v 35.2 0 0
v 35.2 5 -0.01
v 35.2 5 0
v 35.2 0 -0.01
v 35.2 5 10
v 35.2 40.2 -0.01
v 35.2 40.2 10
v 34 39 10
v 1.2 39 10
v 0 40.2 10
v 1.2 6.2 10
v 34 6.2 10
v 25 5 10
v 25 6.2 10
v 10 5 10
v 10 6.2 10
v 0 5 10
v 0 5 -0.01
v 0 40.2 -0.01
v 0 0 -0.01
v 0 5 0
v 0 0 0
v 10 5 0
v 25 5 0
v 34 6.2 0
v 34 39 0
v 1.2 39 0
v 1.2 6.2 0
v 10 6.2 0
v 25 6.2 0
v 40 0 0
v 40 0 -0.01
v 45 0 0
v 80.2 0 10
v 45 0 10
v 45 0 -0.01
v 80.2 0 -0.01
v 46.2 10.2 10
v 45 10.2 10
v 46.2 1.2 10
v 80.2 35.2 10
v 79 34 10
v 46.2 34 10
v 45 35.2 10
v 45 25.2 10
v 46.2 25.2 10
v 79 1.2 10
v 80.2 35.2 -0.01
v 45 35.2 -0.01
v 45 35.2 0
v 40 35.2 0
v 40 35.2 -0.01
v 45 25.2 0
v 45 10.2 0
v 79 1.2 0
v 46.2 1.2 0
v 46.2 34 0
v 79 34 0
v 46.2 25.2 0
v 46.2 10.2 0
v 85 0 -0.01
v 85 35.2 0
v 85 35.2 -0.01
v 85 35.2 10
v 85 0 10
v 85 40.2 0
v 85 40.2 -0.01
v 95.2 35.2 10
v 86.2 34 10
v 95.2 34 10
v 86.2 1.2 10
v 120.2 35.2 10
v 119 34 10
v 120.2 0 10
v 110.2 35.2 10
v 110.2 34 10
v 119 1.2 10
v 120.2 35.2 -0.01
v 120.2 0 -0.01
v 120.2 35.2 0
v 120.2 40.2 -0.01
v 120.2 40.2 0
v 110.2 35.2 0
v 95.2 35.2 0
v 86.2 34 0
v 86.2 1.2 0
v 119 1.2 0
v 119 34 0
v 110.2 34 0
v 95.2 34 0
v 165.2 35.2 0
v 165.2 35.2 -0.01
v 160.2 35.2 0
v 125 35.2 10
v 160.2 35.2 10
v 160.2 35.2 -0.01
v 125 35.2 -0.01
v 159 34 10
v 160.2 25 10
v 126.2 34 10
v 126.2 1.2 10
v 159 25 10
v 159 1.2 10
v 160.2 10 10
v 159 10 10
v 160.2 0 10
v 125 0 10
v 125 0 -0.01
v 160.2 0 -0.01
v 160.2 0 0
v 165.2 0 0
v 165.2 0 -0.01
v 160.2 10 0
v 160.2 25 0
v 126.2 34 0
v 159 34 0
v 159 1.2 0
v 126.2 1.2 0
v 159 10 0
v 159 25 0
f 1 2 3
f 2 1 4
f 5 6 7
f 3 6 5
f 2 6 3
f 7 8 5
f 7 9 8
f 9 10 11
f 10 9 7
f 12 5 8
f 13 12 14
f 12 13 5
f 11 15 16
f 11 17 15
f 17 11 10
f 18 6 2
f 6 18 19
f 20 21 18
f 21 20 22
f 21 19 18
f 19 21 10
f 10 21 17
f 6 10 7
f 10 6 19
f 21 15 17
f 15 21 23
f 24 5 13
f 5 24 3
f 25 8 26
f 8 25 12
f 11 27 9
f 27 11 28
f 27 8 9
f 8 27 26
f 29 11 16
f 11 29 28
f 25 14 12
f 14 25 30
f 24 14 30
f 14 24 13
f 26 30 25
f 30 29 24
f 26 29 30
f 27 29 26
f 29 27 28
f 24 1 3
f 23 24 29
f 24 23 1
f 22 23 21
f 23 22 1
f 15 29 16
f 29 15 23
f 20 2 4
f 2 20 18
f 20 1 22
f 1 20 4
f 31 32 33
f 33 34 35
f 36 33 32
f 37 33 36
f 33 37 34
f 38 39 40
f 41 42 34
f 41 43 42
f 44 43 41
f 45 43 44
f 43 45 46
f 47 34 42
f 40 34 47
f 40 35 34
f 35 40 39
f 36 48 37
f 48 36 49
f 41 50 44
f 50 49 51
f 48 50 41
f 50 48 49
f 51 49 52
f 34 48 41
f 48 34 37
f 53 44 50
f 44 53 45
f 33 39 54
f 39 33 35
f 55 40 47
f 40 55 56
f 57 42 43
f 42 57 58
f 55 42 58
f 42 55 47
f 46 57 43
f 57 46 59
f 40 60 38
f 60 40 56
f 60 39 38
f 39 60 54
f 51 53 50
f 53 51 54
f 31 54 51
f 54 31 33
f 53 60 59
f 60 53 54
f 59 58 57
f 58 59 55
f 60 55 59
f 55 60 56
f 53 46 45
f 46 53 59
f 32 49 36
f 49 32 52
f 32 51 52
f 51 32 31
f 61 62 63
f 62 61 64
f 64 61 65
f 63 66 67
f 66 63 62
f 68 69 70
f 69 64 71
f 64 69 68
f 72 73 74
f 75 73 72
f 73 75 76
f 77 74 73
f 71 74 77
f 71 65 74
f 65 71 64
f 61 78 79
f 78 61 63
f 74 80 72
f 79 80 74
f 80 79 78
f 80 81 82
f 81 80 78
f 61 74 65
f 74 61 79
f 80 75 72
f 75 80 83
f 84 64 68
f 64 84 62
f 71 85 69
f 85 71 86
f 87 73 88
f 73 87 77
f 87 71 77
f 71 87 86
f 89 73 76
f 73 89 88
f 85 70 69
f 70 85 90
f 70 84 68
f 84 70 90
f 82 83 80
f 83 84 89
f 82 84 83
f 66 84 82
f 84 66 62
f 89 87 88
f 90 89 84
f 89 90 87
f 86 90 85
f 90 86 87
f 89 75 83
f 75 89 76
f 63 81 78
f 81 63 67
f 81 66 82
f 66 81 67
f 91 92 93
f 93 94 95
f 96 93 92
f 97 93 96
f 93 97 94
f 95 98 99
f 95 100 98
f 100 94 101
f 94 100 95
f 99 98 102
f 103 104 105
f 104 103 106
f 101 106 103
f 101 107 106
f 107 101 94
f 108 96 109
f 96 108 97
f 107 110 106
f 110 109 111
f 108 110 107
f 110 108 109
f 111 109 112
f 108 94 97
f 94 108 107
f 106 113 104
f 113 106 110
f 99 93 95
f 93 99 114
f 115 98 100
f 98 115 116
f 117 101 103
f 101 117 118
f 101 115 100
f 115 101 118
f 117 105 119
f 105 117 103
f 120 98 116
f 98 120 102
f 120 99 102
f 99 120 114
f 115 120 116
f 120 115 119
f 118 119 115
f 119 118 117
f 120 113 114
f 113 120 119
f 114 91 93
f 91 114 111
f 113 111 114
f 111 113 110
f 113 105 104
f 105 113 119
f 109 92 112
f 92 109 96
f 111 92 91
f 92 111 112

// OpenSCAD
// file: ../../Base/Boxes.scad
// Fischertechnik Box Foundation
// Pre-designed Boxes

use <Constants.scad>

include <PlacementOptions.scad>

box190Width = 190;
box190Depth = 130;
box130Width = 130;
box130Depth = 95;
boxUsageHeight = 33.9;
boxWallThickness = 2.4;
boxBaseThickness = 1.0;

// getBoxWallThickness()
// Gets the wall thickness of a Fischertechnik Box

function getBoxWallThickness() = boxWallThickness;

// Gets the usable height of a fischertechnik box
function getBoxUsageHeight() = boxUsageHeight;

// Gets the thickness of the Fischertechnik box base.
function getBoxBaseThickness() = boxBaseThickness;

// Gets the usable inner space of a Box 190 as an x/y-list
function getBox190Space() = [
    box190Width - 2*getBoxWallThickness(), 
    box190Depth - 2*getBoxWallThickness() ];

// Imports the Fischertechnik empty box 130x190 mm and places it at position 0,0
// 190x130 are the outer sizes, the inner space is slightly smaller. Use getBox190Space() to get the inner sizes.
// This module needs the STL file "Fischertechnik Box 130x190.stl" in the library path.
// The box is positioned that the usable inner space is at the 0,0,0 position. The

module Box190() {
    translate([-getBoxWallThickness(),-getBoxWallThickness(),-getBoxBaseThickness()])
        import("Fischertechnik Box 130x190.stl", convexity=3);
}

// Gets the usable inner space of a Box 130 as an x/y-list
function getBox130Space() = [
    box130Width - 2*getBoxWallThickness(), 
    box130Depth - 2*getBoxWallThickness() ];

// Imports the Fischertechnik empty box 95x130 mm and places it at position 0,0
// 190x130 are the outer sizes, the inner space is slightly smaller. Use getBox190Space() to get the inner sizes.
// This module needs the STL file "Fischertechnik Box 95x130.stl" in the library path.
// The box is positioned that the usable inner space is at the 0,0,0 position. The

module Box130() {
    translate([-getBoxWallThickness(),-getBoxWallThickness(),-getBoxBaseThickness()])
        import("Fischertechnik Box 95x130.stl", convexity=3);
}

// Creates a web at the specified box walls
// corner 0 = LowerLeft, 1 = UpperLeft, 2 = UpperRight, 3 = LowerRight
// side 0 = LeftOfCorner, 1 = RightOfCorner
// distance = Distance in mm from the corner
// box = inner width and depth of the box (default: Box 190)
// webWidth = length of the web (default is 3 mms)
// webThickness = thickness of the web (default is 1 mm)

module BoxWeb(corner, side, distance, box=getBox190Space(), webWidth=3, webThickness=1.0) {
    sink = getBoxWallThickness()/2;

    width = (corner % 2 == 0) ? 
            (side == LeftOfCorner ? webWidth : webThickness) :
            (side == LeftOfCorner ? webThickness : webWidth);

    depth = (corner % 2 == 0) ? 
            (side == RightOfCorner ? webWidth : webThickness) :
            (side == RightOfCorner ? webThickness : webWidth);
    
    xDiff = corner == LowerLeft ? 
                (side == LeftOfCorner ? -sink : distance) :
            (corner == UpperLeft ?                
                (side == LeftOfCorner ? distance : -sink) :
            (corner == UpperRight ?
                (side == LeftOfCorner ? box.x-webWidth+sink : box.x-distance-webThickness) :
                (side == LeftOfCorner ? box.x-distance-webThickness: box.x-webWidth+sink)));

    yDiff = corner == LowerLeft ? 
                (side == RightOfCorner ? -sink : distance) :
            (corner == UpperLeft ?
                (side == RightOfCorner ? box.y-distance : box.y-webWidth+sink) :
            (corner == UpperRight ?
                (side == RightOfCorner ? box.y-webWidth+sink : box.y-distance) :
                (side == RightOfCorner ? distance : -sink)));
    
    translate([xDiff, yDiff, -getExcess()])
        cube([width, depth, boxUsageHeight + 2*getExcess()]);
}
// file: ../../Base/Rotation.scad
// Fischertechnik Box Foundation
// Geometry Helpers Rotation

include <PlacementOptions.scad>

// getRotatedSpace(space, rotation=NoRotation)
// Rotates the space dependent on the specified rotation

function getRotatedSpace(space, rotation=NoRotation) = [
    (rotation == Rotate90 || rotation == Rotate270) ? space.y : space.x,
    (rotation == Rotate90 || rotation == Rotate270) ? space.x : space.y
];

// Rotates the given space around the fixed left lower corner
// space = the space the children needs as width/depth list [width,depth]
// rotation = 0 Rotate0 degrees, 1 Rotate90 degrees, 2 Rotate180 degrees, 3 Rotate270 degrees (equivalent to -90)

module RotateFix(space, rotation=Rotate0) {
    dy = (rotation == Rotate0 || rotation == Rotate270) ? 0 :
        (rotation == Rotate90) ? space.x :
        space.y;
    dx = (rotation < Rotate180) ? 0 :
        (rotation == Rotate180) ? space.x :
        space.y;
    
    translate([dx, dy, 0])
        rotate([0, 0, rotations[rotation]])
            children();
}
// file: ../../Base/Alignment.scad
// Fischertechnik Box Foundation
// Geometry Helpers Alignment

include <PlacementOptions.scad>

// getAlignedX(elementWidth, spaceWidth, align=AlignRight, offset=0)
// Gets the aligned X offset of an element with the given
// width in the given space.
// elementWidth = The width of the element to positon
// spaceWidth = The space where the element should be aligned
// align = 0 AlignLeft, 1 AlignCenter, 2 AlignRight
// offset = an optional offset from the aligned position. When
// aligned left or centered, then positive values are in X direction.
// When aligned right then positive values are in negative X direction.

function getAlignedX(elementWidth, spaceWidth, align=AlignRight, offset=0) =
    (align == AlignLeft) ?
        offset :
        ((align == AlignCenter) ?
        (spaceWidth - elementWidth)/2 + offset :
        spaceWidth - offset - elementWidth);

// getAlignedY(elementDepth, spaceDepth, align=AlignTop, offset=0)
// Gets the aligned Y offset of an element with the given
// depth in the given space.
// elementDepth = The depth of the element to positon
// spaceDepth = The space where the element should be aligned
// align = 0 AlignBottom, 1 AlignCenter, 2 AlignTop
// offset = an optional offset from the aligned position. When
// aligned bottom or centered, then positive values are in Y direction.
// When aligned top then positive values are in negative Y direction.

function getAlignedY(elementDepth, spaceDepth, align=AlignTop, offset=0) =
    (align == AlignBottom) ?
        offset :
        ((align == AlignCenter) ?
        (spaceDepth - elementDepth)/2 + offset :
        spaceDepth - offset - elementDepth);
// file: ../../Base/Constants.scad
// Fischertechnik Box Foundation
// Constants

// Constant values necessary for multiple elements

// Base constants
dividerThickness = 1.2;
excess = 0.01;
fragments = 90;
tolerance = 0.8;

// Gets the thickness of a divider 
function getDividerThickness() = dividerThickness;

// Gets the excess that is used to merge walls into each other
function getExcess() = excess;

// Gets amount of fragments of a cylinder
function getFragments() = fragments;

// Gets the inner tolerance of a frame to each side
function getTolerance() = tolerance;


// Fischertechnik specific constants
axisDiameter = 4;
axisBottomDiameter = axisDiameter + 1;
standardEdgeDistance = 2.5;
standardWebDistance = 11.5;
standardCornerLength = 15;
tubeWallFactor = 1.6;

// Gets axis diameter
function getAxisDiameter() = axisDiameter;

// Gets axis bottom diameter for thicker part at the bottom
function getAxisBottomDiameter() = axisBottomDiameter;

// gets the standard distance to the wall of the box for dockable frames with webs
function getStandardEdgeDistance() = standardEdgeDistance;

// gets the standard distance of each web to the corner of the dockable frame
function getStandardWebDistance() = standardWebDistance;

// gets the standard length of the corner walls of a dockable frame
function getStandardCornerLength() = standardCornerLength;

// gets the wall thickness of a tube.
function getTubeWallThickness() = tubeWallFactor * getDividerThickness();
// file: ../../Base/PlacementOptions.scad
// Fischertechnik Box Foundation
// Placement Options

// Alignment
NoAlign = 0;
AlignLeft = 1;
AlignBottom = 2;
AlignCenter = 3;
AlignRight = 4;
AlignTop = 5;

// Element rotation degree steps
rotations = [0, -90, -180, -270];

// Rotation
NoRotation = 0;
Rotate0 = 0;
Rotate90 = 1;
Rotate180 = 2;
Rotate270 = 3;

// Docking (seen from above)
NoDock = -1;
DockLeft = 0;
DockTop = 1;
DockRight = 2;
DockCorner = 2;
DockBottom = 3;

// Web corners
LowerLeft = 0;
UpperLeft = 1;
UpperRight = 2;
LowerRight = 3;

// Web position relative to corner
LeftOfCorner = 0;
RightOfCorner = 1;
// file: ../../Elements/FramePushButton.scad
// Fischertechnik Box Library
// Frame for Reverse Switch and Push Button (old)
// 31331, 31332

use <../Base/Constants.scad>
use <../ModelBase/Simple.scad>

width = 32;
depth = 32;
height = 10;
addSwitch = 5;

// getFramePushButtonSpace()
// Gets the space the frame for reverse switch or push button needs as width and depth (.x and .y as a list)

function getFramePushButtonSpace() = getFrameOuterVolume([width, depth + addSwitch, height]);

// FramePushButton()
// The walls of the frame are 13 mm high. 
// The complete frame has a tolerance of addition 1 mm in each direction.

module FramePushButton() {
    cutoffWidth = 15;
    cutoffOffset = 10;
    
    Space(getFramePushButtonSpace());
    
    translate([0, addSwitch, 0])
    difference() {
        Frame([width, depth, height]);
        translate([cutoffOffset, -getDividerThickness()/2, 0])
            cube([cutoffWidth, 2*getDividerThickness(), height + getExcess()]);
    }
}

// Tests
color("lightgray") {
FramePushButton();
}
// file: ../../Base/Placement.scad
// Fischertechnik Box Foundation
// Geometry Helpers Placement

use <Constants.scad>
use <Alignment.scad>
use <Rotation.scad>
use <Boxes.scad>

include <PlacementOptions.scad>

// Place(x=0, y=0, elementSpace=[0,0], alignX=AlignLeft, alignY=AlignBottom, rotation=Rotate0, boxSpace=getBox190Space())
// Places the child at the specified position
// y = Y-Position. This is a relative position when an X aligment is specified.
// x = X-Position. This is a relative position when an Y aligment is specified.
// elementSpace = space of the element to be placed [x,y]
// alignX = -1=NoAlign, 0 AlignLeft, 1 AlignCenter, 3 AlignRight (elementSpace and boxSpace required!)
// alignY = -1=NoAlign, 2 AlignBottom, 1 AlignCenter, 4 AlignTop (elementSpace and boxSpace required!)
// rotation = 0 Rotate0 0 degrees, 1 Rotate90 90 degrees, 
// 2 Rotate180 180 degrees, 3 Rotate270 270 degrees (equivalent to -90)
// boxSpace = Inner space of the box where the placement occurs [x,y] - default is Box 190x130 inner space

module Place(x=0, y=0, elementSpace=[0,0], 
  alignX=AlignLeft, alignY=AlignBottom, 
  rotation=NoRotation, boxSpace=getBox190Space()) {

    module Position(x, y, space, rotation=Rotate0) {
        translate([x, y, 0])
            RotateFix(space, rotation)
                children(0);
    }

    space = getRotatedSpace(elementSpace, rotation);
    alignedX = getAlignedX(space.x, boxSpace.x, alignX, x);
    alignedY = getAlignedY(space.y, boxSpace.y, alignY, y);
    Position(alignedX, alignedY, elementSpace, rotation)
        children(0);
}

// Center(space=getBox130Space(), elementSpace=[0,0])
// space = Space where the children is centered. For cylinder use centered=true and no elementSpace.
// elementSpace = space of the element to be centered [x,y]

module Center(space=getBox190Space(), elementSpace=[0,0]) {
    translate([(space.x - elementSpace.x) / 2, (space.y - elementSpace.y) / 2])
        children(0);
}

// CenterHorizontal(width=0, y=0, offset=0, space=getBox130Space())
// space = Space where the children is centered. For cylinder use centered=true and no elementSpace.
// elementSpace = space of the element to be centered [x,y]

module CenterHorizontal(width=0, y=0, offset=0, space=getBox190Space()) {
    translate([(space.x - width) / 2 + offset, y])
        children(0);
}

// CenterVertical(depth=0, x=0, offset=0, space=getBox130Space())
// space = Space where the children is centered. For cylinder use centered=true and no elementSpace.
// elementSpace = space of the element to be centered [x,y]

module CenterVerticalal(depth=0, x=0, offset=0, space=getBox190Space()) {
    translate([x, (space.y - depth) / 2 + offset])
        children(0);
}
// main file
// Fischertechnik Box Foundation
// Elements
// Test FramePulley

use <../../Base/Placement.scad>
use <../../Elements/FramePushButton.scad>

include <../../Base/PlacementOptions.scad>

FramePushButton();

Place(40, 0, getFramePushButtonSpace(), rotation=Rotate90)
    FramePushButton();

Place(85, 0, getFramePushButtonSpace(), rotation=Rotate180)
    FramePushButton();

Place(125, 0, getFramePushButtonSpace(), rotation=Rotate270)
    FramePushButton();
